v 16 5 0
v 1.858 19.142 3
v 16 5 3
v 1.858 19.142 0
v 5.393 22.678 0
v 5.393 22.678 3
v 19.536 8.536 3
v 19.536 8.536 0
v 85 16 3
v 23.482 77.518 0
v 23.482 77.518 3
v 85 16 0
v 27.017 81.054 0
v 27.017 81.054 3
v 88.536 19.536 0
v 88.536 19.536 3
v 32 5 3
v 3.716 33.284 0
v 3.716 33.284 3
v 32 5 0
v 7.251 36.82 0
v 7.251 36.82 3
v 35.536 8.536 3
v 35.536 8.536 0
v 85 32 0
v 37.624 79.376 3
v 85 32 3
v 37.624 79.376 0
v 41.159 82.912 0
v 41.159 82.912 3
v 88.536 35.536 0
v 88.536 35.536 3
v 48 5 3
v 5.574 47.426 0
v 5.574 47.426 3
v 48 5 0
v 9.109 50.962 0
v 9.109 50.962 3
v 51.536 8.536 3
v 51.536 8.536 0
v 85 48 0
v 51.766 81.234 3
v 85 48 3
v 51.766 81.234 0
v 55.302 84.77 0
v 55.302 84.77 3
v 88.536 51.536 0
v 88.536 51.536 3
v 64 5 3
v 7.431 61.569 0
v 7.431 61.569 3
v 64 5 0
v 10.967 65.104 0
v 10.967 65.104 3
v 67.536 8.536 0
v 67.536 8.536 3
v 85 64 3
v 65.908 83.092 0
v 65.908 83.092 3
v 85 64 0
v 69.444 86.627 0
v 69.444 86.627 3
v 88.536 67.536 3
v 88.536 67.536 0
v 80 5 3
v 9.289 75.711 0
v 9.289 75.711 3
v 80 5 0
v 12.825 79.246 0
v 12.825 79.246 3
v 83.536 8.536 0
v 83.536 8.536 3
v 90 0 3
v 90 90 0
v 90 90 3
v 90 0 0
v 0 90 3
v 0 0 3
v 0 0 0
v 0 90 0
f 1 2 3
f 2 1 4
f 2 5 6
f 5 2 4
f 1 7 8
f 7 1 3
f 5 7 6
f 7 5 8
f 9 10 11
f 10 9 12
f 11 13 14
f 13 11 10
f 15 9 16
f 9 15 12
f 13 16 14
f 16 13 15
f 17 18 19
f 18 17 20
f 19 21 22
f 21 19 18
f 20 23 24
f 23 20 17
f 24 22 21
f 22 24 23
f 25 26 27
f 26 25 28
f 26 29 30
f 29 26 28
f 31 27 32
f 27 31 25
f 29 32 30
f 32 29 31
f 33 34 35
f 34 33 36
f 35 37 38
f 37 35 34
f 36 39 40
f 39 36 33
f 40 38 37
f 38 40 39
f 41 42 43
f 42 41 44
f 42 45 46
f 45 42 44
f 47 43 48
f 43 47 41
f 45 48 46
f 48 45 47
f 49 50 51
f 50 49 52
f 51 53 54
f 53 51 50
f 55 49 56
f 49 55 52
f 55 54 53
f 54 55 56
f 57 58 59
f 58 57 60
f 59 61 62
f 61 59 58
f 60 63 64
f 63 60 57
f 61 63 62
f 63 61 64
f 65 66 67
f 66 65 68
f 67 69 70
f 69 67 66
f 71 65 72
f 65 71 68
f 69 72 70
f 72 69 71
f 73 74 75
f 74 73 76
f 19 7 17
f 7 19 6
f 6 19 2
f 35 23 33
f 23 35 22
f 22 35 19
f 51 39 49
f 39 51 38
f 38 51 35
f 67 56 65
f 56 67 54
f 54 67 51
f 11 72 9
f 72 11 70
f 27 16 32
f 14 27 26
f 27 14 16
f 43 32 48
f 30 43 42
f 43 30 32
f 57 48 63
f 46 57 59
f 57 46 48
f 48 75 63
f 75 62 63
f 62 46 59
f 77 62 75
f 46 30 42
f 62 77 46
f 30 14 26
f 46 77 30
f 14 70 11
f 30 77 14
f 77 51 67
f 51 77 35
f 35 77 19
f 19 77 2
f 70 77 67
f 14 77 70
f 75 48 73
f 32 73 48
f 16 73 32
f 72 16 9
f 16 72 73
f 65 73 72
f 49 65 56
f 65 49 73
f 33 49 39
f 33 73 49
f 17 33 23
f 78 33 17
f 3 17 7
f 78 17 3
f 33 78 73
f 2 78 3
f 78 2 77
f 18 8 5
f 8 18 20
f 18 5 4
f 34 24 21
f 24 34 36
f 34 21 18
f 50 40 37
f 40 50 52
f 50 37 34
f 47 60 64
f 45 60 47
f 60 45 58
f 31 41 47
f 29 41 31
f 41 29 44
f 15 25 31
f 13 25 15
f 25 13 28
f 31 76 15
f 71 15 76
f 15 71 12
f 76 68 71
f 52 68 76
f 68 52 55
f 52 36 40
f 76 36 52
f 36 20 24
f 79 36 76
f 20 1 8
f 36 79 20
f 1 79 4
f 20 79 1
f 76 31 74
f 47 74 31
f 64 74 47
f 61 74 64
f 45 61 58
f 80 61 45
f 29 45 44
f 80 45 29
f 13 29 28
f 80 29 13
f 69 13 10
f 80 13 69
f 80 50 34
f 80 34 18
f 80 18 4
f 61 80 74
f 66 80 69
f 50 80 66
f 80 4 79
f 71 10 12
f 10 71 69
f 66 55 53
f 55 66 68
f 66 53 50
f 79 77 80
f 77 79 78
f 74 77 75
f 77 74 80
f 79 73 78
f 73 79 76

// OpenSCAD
// sizes:
w = 90;
h = 90;
d = 3;

// holes:
hw = 5;
hw_gap = 5;
count = w / (hw + hw_gap);

difference(){
    cube([w,h,d]);
    
    for(i = [1 : count]){
        if(i < count / 2 + 0.5){
             color("red")
             cubes(i);
            }
        if (i==count/2 + 0.5) {
             color("green")
             cubes(i);
            }
        else {
             color("green")
             otherCube(i);
            }
    }
}

module cubes(var) {
     translate([var*(hw+hw_gap)+var*6, hw_gap, -1])
     rotate([0,0,45])
     cube([hw, (hw_gap*2)*(var*2), d + 2]);
    }
    
module otherCube(var) {
    translate([w-hw_gap, (var)*(hw+hw_gap)+(var)*6, -1])
    rotate([0,0,45])
    cube([hw, hw_gap*4*(count-var-3.65), d+2]);
    
    }  
